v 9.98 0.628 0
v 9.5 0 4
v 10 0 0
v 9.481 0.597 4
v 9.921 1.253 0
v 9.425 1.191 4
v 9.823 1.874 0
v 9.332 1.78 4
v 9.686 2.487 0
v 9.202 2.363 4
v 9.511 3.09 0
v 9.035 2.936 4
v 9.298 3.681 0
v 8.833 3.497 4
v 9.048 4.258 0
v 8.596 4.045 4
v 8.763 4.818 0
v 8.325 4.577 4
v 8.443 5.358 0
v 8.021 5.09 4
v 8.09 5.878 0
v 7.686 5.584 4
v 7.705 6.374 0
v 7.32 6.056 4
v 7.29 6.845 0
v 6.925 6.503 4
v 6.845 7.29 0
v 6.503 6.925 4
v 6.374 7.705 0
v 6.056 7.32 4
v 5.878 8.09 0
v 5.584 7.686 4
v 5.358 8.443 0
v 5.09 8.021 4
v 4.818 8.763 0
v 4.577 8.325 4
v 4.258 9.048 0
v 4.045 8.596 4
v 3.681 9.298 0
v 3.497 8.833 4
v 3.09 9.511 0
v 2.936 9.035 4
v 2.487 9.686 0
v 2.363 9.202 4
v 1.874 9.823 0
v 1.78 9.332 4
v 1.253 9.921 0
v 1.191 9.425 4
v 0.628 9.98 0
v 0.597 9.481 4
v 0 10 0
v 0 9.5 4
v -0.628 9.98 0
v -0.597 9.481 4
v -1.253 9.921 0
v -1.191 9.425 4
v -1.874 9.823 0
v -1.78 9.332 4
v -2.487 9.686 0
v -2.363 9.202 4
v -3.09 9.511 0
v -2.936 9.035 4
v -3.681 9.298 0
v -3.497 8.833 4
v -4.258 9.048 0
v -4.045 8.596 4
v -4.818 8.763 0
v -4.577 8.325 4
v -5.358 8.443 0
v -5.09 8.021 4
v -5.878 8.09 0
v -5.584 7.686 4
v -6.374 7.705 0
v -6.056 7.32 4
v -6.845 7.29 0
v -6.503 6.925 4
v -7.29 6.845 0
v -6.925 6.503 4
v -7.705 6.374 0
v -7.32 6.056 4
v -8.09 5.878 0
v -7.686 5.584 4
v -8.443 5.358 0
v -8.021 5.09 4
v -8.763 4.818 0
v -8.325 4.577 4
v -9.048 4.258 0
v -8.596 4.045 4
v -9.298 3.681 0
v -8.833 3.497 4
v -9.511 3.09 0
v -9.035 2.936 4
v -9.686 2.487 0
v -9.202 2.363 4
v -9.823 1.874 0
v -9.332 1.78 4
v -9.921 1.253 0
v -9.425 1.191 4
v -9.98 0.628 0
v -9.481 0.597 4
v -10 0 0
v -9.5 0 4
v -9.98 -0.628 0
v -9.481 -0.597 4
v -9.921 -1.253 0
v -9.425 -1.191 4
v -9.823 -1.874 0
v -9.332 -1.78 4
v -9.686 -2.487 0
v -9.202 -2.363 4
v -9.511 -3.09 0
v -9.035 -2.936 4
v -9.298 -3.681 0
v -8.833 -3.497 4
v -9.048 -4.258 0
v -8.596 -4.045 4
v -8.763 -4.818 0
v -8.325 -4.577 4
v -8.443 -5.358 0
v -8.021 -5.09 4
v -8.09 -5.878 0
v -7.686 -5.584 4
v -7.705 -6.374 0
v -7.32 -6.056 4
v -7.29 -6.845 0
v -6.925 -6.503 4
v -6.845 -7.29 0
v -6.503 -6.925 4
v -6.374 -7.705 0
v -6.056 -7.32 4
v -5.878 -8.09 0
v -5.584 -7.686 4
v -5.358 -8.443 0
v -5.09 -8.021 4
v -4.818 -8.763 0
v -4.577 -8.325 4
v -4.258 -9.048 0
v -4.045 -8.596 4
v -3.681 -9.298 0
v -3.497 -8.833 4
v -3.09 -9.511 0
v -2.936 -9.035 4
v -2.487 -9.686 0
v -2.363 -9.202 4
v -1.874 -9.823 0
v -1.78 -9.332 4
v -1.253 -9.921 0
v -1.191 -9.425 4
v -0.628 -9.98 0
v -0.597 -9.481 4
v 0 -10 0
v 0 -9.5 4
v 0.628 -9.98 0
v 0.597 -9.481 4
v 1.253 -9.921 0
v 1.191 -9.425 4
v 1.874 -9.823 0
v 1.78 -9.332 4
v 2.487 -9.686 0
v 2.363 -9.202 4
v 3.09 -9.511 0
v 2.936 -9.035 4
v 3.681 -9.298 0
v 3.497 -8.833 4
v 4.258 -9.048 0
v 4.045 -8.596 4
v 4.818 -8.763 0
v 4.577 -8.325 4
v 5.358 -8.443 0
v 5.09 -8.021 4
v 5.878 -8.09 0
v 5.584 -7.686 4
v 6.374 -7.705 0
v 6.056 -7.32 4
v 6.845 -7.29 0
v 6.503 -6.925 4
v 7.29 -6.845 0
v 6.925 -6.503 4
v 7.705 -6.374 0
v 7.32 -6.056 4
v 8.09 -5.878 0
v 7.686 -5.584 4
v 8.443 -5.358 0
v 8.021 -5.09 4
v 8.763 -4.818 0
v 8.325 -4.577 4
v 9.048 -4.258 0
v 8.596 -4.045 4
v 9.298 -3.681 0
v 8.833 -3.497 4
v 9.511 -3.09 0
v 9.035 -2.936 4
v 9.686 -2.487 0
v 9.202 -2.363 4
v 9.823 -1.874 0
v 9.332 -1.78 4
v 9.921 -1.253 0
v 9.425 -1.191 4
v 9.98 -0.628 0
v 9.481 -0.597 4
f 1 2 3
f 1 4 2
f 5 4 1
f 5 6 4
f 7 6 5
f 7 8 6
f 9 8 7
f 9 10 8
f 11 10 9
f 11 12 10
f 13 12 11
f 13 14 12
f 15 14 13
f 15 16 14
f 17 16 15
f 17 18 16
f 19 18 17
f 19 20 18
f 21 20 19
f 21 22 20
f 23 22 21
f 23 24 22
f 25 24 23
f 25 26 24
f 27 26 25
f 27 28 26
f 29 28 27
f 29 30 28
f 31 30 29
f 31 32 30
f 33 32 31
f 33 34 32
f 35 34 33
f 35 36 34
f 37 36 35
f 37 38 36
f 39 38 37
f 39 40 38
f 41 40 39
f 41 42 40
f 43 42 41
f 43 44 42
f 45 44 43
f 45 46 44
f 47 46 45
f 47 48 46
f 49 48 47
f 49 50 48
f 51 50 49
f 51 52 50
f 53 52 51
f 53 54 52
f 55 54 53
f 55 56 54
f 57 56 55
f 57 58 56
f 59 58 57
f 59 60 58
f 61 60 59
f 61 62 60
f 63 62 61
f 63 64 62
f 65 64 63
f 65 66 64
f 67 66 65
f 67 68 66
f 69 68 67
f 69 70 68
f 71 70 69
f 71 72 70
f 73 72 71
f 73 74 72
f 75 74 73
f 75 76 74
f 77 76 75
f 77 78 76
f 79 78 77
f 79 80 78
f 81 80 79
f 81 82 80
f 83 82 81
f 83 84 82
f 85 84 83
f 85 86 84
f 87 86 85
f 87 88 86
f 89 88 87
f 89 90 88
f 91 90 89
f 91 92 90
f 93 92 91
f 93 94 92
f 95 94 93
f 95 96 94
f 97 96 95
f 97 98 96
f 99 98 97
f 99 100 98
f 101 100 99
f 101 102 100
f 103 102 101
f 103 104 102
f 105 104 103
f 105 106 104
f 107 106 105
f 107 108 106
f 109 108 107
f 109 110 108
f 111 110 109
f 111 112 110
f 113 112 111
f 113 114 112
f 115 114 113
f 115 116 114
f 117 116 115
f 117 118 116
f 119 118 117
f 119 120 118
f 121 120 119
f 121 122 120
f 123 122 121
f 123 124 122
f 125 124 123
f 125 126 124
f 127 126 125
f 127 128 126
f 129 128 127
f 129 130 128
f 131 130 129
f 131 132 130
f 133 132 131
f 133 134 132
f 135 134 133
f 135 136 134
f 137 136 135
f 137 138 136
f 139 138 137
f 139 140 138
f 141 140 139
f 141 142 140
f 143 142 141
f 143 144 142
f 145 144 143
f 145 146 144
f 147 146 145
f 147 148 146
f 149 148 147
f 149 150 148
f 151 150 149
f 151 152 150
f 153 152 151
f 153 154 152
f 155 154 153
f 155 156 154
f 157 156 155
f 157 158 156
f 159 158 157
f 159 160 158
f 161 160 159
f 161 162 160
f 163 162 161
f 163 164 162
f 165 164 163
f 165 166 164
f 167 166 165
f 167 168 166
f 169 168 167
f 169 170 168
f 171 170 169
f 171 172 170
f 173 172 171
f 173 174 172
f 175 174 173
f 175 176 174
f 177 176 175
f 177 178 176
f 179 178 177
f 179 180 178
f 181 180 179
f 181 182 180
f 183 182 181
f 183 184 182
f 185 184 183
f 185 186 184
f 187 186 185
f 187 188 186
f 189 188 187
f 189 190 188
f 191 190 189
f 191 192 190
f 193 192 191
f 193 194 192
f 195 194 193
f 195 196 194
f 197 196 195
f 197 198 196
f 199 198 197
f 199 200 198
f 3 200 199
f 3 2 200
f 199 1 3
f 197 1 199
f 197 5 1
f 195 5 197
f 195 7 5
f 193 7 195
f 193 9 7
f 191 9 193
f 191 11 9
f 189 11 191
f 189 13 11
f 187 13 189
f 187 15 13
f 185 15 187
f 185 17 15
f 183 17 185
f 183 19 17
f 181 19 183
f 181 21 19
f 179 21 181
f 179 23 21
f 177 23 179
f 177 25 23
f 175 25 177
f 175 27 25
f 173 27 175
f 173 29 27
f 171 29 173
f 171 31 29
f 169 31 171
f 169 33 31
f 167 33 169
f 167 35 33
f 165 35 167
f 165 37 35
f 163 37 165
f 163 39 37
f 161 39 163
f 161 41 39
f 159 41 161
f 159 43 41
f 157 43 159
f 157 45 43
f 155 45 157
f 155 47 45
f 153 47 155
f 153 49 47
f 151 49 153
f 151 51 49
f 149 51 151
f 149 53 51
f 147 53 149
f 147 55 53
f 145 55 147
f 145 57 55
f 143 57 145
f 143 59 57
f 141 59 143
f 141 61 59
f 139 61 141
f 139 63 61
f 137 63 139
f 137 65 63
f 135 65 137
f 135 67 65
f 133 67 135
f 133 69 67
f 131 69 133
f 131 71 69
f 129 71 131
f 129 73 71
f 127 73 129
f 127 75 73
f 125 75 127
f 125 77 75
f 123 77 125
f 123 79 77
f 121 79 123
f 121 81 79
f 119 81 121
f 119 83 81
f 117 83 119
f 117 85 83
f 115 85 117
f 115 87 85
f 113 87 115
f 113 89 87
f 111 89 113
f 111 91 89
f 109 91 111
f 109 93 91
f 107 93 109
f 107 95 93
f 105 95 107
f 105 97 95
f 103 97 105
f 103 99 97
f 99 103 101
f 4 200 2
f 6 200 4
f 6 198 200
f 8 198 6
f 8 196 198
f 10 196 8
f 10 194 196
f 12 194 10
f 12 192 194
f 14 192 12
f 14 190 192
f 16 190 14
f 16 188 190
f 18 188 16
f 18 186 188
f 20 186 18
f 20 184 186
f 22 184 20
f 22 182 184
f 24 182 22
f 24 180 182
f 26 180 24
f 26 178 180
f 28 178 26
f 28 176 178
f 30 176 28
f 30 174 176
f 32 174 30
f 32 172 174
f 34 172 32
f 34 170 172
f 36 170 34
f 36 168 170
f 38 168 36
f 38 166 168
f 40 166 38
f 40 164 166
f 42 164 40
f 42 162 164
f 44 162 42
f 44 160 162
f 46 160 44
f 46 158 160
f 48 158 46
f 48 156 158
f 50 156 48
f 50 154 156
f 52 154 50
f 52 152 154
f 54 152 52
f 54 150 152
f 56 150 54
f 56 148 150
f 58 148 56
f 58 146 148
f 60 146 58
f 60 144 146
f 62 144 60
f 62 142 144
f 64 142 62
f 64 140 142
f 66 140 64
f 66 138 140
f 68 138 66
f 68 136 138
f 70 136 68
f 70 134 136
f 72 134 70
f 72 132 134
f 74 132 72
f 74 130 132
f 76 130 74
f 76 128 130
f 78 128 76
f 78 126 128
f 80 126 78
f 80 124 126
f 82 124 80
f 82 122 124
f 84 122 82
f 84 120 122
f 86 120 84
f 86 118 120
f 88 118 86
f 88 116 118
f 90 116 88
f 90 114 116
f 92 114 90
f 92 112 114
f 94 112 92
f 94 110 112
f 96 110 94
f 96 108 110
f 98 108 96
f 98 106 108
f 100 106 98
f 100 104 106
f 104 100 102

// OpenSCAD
// file: build.scad
$build_id = "";

function building(filename) = is_undef(filename) ?
  !is_undef(build)
  : !is_undef(build) && build == filename;

function previewing() = !building();

module build(filename) {
  $build_id = filename;

  if(!is_undef(scad_build_scan) && scad_build_scan == true) {
    echo(str("scad_build_scan: ", filename));
  }
  else if(previewing() || build == filename) {
    children();
  }
}

module preview_row(spacing) {
  if(previewing()) {
    for(x = [0:1:$children - 1]) {
      translate([x * spacing, 0, 0]) {
        children(x);
      }
    }
  }
  else {
    children();
  }
}

module preview_column(spacing) {
  if(previewing()) {
    for(y = [0:1:$children - 1]) {
      translate([0, y * spacing, 0]) {
        children(y);
      }
    }
  }
  else {
    children();
  }
}
// file: minibase.scad
// Based off of titancraft's Customizable Miniature Base (CC0 1.0)
// https://www.thingiverse.com/thing:1112237

include <./build.scad>

$base_rim = 1; //	[1: tapered, 2: inclined, 3: flat]
// Number of sides:
$base_shape = 100; //	[30:Low-res Circle, 100: Hi-res Circle, 5:Pentagon, 6:Hexagon, 8:Octagon, 4:Square, 3:Triangle]

$base_diameter = 32;
$base_height = 4;
$base_slant = 95; // [50:100]

// Percentage:
$base_stretch = 100;

//('Cool' base only)
$base_inner_circle_ratio = 40; // [10:80]

module tapered(r=40) {
  $base_rim = 1;
  $base_inner_circle_ratio = r;

  children();
}

module inclined() {
  $base_rim = 2;

  children();
}

module flat() {
  $base_rim = 3;

  children();
}

module shape(s) {
  $base_shape = s;

  children();
}

module diameter(d) {
  $base_diameter = d;

  children();
}

module height(h) {
  $base_height = h;

  children();
}

module slant(s) {
  $base_slant = s;

  children();
}

module stretch(s) {
  $base_stretch = s;

  children();
}

module base(id) {
  build(id) union() {
    radius = $base_diameter/2;
    scale([$base_stretch/100, 1, 1]){
      if ($base_rim == 1){
        // tapered base
        cyl1_height = $base_height * (1-$base_inner_circle_ratio/100);
        cylinder(cyl1_height, radius, radius * $base_slant/100, $fn=$base_shape);

        cyl2_radius = radius  * $base_slant/100 * .95;
        cyl2_height = $base_height - cyl1_height;

        translate([0, 0, cyl1_height]){
          cylinder(cyl2_height, cyl2_radius, cyl2_radius * $base_slant/100, $fn=$base_shape);
          cylinder(cyl2_height*.5, radius * $base_slant/100, cyl2_radius, $fn=$base_shape);
        }
      } else if ($base_rim == 2){
        // inclined base
        cylinder($base_height, radius, radius * $base_slant/100, $fn=$base_shape);
      } else if ($base_rim == 3){
        // flat base

        cylinder($base_height, radius, radius, $fn=$base_shape);
      }
    }
  }
}
// main file
include <./minibase.scad>

inclined() diameter(20) base("20mm-opr-infantry-small");
